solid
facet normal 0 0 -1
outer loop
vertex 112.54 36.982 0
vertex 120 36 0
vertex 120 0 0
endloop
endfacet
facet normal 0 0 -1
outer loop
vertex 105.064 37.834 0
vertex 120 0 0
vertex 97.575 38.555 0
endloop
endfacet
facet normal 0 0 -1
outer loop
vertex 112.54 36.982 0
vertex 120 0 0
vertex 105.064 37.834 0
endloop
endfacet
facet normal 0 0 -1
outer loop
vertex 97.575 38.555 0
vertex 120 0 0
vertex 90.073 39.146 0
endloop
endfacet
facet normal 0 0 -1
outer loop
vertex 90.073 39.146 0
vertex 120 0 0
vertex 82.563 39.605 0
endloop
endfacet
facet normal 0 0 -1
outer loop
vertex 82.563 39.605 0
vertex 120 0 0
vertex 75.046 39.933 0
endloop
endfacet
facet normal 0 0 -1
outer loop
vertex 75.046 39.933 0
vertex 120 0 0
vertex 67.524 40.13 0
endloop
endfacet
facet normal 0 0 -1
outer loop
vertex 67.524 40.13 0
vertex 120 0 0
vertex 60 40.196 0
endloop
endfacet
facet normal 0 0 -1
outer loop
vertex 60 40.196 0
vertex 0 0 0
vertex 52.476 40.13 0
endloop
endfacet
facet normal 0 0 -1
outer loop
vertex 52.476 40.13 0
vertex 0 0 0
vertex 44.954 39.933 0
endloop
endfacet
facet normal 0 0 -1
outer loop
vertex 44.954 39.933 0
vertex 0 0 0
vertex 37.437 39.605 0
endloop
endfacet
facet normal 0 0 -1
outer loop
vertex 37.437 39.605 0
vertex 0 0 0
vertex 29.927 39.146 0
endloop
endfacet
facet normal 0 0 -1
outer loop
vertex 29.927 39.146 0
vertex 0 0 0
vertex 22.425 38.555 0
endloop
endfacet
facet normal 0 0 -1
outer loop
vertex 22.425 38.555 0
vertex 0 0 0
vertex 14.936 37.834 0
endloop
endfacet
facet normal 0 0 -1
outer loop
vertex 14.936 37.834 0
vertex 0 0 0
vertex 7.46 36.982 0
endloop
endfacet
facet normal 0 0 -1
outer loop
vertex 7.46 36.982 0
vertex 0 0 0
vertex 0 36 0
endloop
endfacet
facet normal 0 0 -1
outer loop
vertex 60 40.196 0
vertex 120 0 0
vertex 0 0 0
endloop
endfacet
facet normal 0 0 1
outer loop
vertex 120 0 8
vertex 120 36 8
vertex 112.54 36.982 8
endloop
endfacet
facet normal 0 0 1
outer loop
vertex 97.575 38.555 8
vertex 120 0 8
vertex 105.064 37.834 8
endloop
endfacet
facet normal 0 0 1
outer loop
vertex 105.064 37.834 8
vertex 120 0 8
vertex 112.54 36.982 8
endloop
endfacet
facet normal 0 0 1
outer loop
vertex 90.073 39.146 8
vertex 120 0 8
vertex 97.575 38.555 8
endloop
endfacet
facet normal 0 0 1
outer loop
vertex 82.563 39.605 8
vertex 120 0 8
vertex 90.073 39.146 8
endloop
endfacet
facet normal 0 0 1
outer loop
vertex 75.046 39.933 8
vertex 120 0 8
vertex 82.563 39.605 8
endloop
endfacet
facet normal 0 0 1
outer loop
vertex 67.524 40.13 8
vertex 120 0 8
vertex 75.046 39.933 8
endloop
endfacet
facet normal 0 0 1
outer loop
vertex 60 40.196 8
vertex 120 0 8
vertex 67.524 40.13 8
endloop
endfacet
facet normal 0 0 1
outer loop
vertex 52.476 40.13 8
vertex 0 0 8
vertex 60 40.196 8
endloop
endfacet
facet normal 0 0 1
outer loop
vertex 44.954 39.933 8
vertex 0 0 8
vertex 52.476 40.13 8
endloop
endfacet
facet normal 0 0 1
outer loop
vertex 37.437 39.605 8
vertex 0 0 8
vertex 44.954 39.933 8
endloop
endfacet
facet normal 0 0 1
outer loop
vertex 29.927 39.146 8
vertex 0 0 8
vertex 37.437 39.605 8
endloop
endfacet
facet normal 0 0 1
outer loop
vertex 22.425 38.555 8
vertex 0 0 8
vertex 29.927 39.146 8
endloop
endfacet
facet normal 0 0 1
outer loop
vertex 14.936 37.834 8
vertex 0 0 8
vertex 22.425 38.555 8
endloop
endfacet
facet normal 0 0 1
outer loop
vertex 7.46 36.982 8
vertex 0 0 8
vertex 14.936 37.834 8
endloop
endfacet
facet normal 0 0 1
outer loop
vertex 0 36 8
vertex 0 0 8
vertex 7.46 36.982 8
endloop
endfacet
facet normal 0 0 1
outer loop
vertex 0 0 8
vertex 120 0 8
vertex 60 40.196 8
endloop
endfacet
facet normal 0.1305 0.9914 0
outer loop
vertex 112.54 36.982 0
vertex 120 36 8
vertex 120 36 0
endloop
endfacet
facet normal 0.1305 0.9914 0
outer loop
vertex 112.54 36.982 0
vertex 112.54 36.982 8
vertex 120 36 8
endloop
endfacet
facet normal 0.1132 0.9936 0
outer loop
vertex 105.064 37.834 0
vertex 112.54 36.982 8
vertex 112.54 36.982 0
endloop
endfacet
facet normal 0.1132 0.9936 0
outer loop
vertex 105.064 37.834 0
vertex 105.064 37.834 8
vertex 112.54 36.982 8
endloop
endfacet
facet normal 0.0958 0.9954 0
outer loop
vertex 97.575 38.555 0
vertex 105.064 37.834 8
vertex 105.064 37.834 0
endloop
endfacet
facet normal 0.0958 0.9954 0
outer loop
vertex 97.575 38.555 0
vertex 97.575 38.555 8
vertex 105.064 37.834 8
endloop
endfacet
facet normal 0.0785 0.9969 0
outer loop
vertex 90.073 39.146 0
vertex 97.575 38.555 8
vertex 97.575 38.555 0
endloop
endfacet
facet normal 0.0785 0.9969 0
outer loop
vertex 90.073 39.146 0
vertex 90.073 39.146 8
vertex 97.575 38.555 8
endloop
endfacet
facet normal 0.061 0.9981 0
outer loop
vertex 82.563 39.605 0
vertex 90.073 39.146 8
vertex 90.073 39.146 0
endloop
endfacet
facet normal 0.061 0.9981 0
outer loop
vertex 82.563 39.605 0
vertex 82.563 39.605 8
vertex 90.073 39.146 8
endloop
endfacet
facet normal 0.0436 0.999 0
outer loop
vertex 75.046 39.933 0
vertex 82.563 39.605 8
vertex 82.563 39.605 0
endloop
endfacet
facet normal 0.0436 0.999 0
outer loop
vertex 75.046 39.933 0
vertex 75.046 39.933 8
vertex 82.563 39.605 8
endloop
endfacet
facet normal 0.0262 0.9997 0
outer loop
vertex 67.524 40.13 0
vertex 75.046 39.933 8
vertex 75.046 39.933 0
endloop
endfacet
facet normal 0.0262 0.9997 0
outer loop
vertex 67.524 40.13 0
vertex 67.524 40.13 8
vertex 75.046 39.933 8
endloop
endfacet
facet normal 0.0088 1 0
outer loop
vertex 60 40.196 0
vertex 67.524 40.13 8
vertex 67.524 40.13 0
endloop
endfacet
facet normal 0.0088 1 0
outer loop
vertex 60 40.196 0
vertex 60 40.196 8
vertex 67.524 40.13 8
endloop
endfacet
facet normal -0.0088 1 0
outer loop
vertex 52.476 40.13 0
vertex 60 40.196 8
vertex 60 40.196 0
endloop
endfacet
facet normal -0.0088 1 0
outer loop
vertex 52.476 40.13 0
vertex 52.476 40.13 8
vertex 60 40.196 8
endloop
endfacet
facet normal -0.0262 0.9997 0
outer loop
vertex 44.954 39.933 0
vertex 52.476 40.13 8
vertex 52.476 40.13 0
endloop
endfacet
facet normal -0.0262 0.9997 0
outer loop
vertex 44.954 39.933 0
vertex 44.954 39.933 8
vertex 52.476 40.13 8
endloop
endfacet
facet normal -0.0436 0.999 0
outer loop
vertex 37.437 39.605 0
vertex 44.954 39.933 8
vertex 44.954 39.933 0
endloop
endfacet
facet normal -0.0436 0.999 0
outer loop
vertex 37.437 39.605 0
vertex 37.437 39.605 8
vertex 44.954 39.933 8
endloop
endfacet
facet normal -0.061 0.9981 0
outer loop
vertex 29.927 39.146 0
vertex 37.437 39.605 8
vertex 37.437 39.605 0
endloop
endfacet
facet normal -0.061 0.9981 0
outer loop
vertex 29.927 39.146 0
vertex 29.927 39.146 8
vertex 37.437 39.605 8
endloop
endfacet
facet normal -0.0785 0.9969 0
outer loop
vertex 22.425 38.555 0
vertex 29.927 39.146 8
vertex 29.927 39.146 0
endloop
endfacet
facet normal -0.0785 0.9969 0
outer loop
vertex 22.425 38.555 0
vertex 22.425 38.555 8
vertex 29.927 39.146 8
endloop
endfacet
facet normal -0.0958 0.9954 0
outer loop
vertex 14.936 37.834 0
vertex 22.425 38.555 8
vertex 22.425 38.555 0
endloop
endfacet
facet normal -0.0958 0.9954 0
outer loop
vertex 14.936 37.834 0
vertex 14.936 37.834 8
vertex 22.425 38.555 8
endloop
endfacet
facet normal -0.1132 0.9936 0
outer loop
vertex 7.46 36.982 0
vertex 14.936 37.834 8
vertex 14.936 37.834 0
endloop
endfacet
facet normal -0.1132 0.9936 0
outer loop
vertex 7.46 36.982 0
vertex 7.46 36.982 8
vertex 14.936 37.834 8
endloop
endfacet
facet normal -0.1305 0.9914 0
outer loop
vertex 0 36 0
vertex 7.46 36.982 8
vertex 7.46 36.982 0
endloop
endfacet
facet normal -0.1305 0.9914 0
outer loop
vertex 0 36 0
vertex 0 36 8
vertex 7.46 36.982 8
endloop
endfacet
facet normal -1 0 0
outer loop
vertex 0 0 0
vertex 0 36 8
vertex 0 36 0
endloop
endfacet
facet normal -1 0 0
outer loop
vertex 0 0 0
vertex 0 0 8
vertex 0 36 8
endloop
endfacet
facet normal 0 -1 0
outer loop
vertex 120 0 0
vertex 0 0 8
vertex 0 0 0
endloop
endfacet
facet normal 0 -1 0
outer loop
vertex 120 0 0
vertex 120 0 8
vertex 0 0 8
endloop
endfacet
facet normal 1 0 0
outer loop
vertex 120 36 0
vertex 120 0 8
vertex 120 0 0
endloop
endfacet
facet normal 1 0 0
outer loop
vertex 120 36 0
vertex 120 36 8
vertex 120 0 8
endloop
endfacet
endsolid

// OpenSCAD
$fn = 32;

// ----------------------------------------------------------------------
// Arc profile plate: crown, 19 points
// ----------------------------------------------------------------------

// --- parameters (mm) ---
bar_l = 120;              // bar length, X
bar_w = 36;               // bar height at the ends, Y
arc_r = 431.12;           // radius of the crown arc
arc_angle = 16;           // crown arc angle, degrees
crown_rise = 4.2;         // rise of the crown over the ends
arc_step = 1;             // sampling step of the crown arc, degrees
plate_t = 8;              // plate thickness, Z
fit_tol = 0.1;            // declared fit tolerance (prompt contract)
free_tol = 0.5;           // declared free tolerance (prompt contract)

bbox_y = bar_w + crown_rise;  // full height with the crown

profile = [[120, 36], [112.54, 36.982], [105.064, 37.834], [97.575, 38.555], [90.073, 39.146], [82.563, 39.605], [75.046, 39.933], [67.524, 40.13], [60, 40.196], [52.476, 40.13], [44.954, 39.933], [37.437, 39.605], [29.927, 39.146], [22.425, 38.555], [14.936, 37.834], [7.46, 36.982], [0, 36], [0, 0], [120, 0]];  // primary outline, 19 points, counter clockwise

// --- the one profile operation ---
linear_extrude(height = plate_t) polygon(points = profile);
